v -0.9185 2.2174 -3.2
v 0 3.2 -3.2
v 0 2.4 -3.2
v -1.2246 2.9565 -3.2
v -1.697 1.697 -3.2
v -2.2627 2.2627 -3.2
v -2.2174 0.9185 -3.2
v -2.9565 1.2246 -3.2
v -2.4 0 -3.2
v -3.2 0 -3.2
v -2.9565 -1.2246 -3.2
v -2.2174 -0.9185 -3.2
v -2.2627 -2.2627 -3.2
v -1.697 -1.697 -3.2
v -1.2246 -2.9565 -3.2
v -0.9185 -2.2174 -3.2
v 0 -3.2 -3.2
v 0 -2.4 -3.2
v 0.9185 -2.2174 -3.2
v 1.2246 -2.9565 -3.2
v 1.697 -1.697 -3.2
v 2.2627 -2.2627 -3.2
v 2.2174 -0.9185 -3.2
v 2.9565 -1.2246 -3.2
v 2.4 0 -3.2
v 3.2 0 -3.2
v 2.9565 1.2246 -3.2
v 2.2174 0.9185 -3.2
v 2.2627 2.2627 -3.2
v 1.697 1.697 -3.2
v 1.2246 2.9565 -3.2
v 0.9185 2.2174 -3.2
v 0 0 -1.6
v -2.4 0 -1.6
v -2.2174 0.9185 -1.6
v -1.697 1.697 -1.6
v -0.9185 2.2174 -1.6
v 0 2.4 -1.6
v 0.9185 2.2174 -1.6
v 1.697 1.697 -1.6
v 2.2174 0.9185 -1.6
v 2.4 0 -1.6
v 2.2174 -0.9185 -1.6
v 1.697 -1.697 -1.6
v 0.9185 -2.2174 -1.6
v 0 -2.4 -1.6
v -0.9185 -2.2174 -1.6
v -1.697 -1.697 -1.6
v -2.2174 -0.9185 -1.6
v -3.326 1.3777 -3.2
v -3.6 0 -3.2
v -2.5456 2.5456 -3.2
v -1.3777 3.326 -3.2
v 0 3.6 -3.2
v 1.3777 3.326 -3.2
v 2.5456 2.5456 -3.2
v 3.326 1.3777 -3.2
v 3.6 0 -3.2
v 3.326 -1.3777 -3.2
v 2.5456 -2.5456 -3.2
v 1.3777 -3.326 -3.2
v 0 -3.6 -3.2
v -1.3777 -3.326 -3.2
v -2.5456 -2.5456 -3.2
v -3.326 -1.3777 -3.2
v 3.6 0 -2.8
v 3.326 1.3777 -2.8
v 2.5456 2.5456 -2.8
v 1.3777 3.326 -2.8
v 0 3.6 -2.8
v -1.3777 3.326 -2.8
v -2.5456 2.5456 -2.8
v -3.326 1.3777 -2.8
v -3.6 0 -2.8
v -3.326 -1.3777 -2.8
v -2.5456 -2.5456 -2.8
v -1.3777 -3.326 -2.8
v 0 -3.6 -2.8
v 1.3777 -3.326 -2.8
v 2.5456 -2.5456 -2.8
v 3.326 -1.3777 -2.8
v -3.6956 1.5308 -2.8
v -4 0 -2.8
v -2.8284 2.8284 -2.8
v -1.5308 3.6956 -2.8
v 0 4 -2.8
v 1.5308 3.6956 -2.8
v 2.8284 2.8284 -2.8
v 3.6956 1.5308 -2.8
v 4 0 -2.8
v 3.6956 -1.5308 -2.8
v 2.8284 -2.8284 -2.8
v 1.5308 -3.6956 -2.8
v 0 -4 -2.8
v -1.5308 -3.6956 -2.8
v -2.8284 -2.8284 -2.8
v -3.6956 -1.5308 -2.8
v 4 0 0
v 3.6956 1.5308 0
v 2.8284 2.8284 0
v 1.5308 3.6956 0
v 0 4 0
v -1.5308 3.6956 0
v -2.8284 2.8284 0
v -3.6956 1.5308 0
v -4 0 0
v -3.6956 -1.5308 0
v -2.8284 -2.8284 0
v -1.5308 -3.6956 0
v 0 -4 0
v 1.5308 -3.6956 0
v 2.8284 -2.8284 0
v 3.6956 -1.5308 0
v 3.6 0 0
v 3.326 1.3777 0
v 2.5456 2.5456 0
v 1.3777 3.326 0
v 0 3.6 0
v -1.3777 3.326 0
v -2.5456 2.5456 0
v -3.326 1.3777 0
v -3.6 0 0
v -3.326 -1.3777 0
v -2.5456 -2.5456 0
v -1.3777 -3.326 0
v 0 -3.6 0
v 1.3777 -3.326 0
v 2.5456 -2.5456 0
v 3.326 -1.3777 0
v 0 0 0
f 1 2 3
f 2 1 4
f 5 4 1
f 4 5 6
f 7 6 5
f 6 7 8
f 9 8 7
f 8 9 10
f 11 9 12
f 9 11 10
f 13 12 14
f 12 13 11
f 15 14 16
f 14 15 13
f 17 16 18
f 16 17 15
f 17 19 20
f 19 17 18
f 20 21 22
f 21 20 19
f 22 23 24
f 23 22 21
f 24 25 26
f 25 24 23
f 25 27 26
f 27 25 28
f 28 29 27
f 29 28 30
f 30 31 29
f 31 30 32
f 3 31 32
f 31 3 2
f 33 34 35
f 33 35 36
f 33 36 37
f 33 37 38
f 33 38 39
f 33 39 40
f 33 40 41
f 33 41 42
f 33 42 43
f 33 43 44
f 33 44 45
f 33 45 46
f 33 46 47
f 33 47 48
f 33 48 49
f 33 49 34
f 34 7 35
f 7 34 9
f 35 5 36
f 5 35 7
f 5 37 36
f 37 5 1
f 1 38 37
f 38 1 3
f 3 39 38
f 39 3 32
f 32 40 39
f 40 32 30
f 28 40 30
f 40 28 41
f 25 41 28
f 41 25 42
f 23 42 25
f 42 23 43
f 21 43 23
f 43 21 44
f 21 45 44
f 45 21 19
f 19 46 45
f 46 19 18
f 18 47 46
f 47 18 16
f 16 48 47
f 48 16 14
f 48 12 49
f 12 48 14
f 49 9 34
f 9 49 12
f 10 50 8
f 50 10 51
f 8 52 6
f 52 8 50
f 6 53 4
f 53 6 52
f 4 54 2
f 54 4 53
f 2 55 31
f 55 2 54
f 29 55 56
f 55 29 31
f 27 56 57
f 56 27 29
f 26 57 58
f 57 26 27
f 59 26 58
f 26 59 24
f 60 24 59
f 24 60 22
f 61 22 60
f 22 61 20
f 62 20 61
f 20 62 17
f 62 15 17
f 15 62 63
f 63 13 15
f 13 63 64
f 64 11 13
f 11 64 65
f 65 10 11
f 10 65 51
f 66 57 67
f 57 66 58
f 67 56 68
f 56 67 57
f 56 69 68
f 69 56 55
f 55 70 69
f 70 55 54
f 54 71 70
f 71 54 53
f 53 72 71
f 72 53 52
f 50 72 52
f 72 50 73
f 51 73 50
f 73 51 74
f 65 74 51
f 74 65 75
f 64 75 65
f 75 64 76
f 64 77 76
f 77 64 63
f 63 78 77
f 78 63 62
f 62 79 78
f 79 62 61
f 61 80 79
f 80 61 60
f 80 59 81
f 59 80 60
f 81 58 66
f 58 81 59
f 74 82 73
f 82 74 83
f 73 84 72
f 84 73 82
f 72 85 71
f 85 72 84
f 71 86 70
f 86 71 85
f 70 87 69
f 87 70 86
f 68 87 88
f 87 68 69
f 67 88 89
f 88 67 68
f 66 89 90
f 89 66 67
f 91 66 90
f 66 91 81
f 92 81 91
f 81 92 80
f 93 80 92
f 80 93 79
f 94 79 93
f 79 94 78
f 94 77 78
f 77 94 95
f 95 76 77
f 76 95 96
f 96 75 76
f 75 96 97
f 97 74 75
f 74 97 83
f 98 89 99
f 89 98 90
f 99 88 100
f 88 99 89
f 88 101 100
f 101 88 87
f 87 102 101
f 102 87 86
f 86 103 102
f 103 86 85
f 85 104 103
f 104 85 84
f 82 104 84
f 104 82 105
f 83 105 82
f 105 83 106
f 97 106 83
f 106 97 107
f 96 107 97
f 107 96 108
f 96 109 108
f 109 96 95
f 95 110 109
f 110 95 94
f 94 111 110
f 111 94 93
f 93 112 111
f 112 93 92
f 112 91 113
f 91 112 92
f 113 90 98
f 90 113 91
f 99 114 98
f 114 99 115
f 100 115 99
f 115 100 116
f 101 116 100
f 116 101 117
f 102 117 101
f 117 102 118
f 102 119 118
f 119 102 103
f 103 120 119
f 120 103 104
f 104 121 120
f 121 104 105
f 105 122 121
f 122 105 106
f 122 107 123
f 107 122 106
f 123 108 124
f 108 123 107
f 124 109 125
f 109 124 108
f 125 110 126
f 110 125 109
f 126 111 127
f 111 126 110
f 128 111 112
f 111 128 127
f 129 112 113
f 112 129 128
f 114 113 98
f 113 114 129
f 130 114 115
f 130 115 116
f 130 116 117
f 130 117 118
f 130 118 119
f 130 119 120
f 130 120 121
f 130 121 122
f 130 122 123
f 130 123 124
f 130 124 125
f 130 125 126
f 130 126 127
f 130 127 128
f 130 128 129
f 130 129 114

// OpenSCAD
// file: ../p/4-4ring3.scad
use <../lib.scad>
function ldraw_lib__4_4ring3() = [
// 0 Ring  3 x 1.0
// 0 Name: 4-4ring3.dat
// 0 Author: James Jessiman
// 0 !LDRAW_ORG Primitive UPDATE 2009-01
// 0 !LICENSE Licensed under CC BY 4.0 : see CAreadme.txt
// 
// 0 BFC CERTIFY CCW
  [0,"BFC","CERTIFY"],
  [0,"BFC","CCW"],
// 
// 0 !HISTORY 1998-12-15 [PTadmin] Official Update 1998-10
// 0 !HISTORY 2002-04-05 [hafhead] Added BFC statement
// 0 !HISTORY 2002-04-25 [PTadmin] Official Update 2002-02
// 0 !HISTORY 2007-06-24 [PTadmin] Header formatted for Contributor Agreement
// 0 !HISTORY 2008-07-01 [PTadmin] Official Update 2008-01
// 0 !HISTORY 2008-08-26 [cwdee] Switch polygon winding and rename
// 0 !HISTORY 2009-05-02 [PTadmin] Official Update 2009-01
// 
// 
// 4 16 -1.5308 0 3.6956 -1.1481 0 2.7717 0 0 3 0 0 4
  [4,16,-1.5308,0,3.6956,-1.1481,0,2.7717,0,0,3,0,0,4],
// 4 16 -2.8284 0 2.8284 -2.1213 0 2.1213 -1.1481 0 2.7717 -1.5308 0 3.6956
  [4,16,-2.8284,0,2.8284,-2.1213,0,2.1213,-1.1481,0,2.7717,-1.5308,0,3.6956],
// 4 16 -3.6956 0 1.5308 -2.7717 0 1.1481 -2.1213 0 2.1213 -2.8284 0 2.8284
  [4,16,-3.6956,0,1.5308,-2.7717,0,1.1481,-2.1213,0,2.1213,-2.8284,0,2.8284],
// 4 16 -4 0 0 -3 0 0 -2.7717 0 1.1481 -3.6956 0 1.5308
  [4,16,-4,0,0,-3,0,0,-2.7717,0,1.1481,-3.6956,0,1.5308],
// 4 16 -3.6956 0 -1.5308 -2.7717 0 -1.1481 -3 0 0 -4 0 0
  [4,16,-3.6956,0,-1.5308,-2.7717,0,-1.1481,-3,0,0,-4,0,0],
// 4 16 -2.8284 0 -2.8284 -2.1213 0 -2.1213 -2.7717 0 -1.1481 -3.6956 0 -1.5308
  [4,16,-2.8284,0,-2.8284,-2.1213,0,-2.1213,-2.7717,0,-1.1481,-3.6956,0,-1.5308],
// 4 16 -1.5308 0 -3.6956 -1.1481 0 -2.7717 -2.1213 0 -2.1213 -2.8284 0 -2.8284
  [4,16,-1.5308,0,-3.6956,-1.1481,0,-2.7717,-2.1213,0,-2.1213,-2.8284,0,-2.8284],
// 4 16 0 0 -4 0 0 -3 -1.1481 0 -2.7717 -1.5308 0 -3.6956
  [4,16,0,0,-4,0,0,-3,-1.1481,0,-2.7717,-1.5308,0,-3.6956],
// 4 16 1.5308 0 -3.6956 1.1481 0 -2.7717 0 0 -3 0 0 -4
  [4,16,1.5308,0,-3.6956,1.1481,0,-2.7717,0,0,-3,0,0,-4],
// 4 16 2.8284 0 -2.8284 2.1213 0 -2.1213 1.1481 0 -2.7717 1.5308 0 -3.6956
  [4,16,2.8284,0,-2.8284,2.1213,0,-2.1213,1.1481,0,-2.7717,1.5308,0,-3.6956],
// 4 16 3.6956 0 -1.5308 2.7717 0 -1.1481 2.1213 0 -2.1213 2.8284 0 -2.8284
  [4,16,3.6956,0,-1.5308,2.7717,0,-1.1481,2.1213,0,-2.1213,2.8284,0,-2.8284],
// 4 16 4 0 0 3 0 0 2.7717 0 -1.1481 3.6956 0 -1.5308
  [4,16,4,0,0,3,0,0,2.7717,0,-1.1481,3.6956,0,-1.5308],
// 4 16 3.6956 0 1.5308 2.7717 0 1.1481 3 0 0 4 0 0
  [4,16,3.6956,0,1.5308,2.7717,0,1.1481,3,0,0,4,0,0],
// 4 16 2.8284 0 2.8284 2.1213 0 2.1213 2.7717 0 1.1481 3.6956 0 1.5308
  [4,16,2.8284,0,2.8284,2.1213,0,2.1213,2.7717,0,1.1481,3.6956,0,1.5308],
// 4 16 1.5308 0 3.6956 1.1481 0 2.7717 2.1213 0 2.1213 2.8284 0 2.8284
  [4,16,1.5308,0,3.6956,1.1481,0,2.7717,2.1213,0,2.1213,2.8284,0,2.8284],
// 4 16 0 0 4 0 0 3 1.1481 0 2.7717 1.5308 0 3.6956
  [4,16,0,0,4,0,0,3,1.1481,0,2.7717,1.5308,0,3.6956],
// 0
];
module ldraw_lib__4_4ring3(step=0, col=false, unit=2/5, alt=false, line=0.2, solid=!$preview)
    makepoly(ldraw_lib__4_4ring3(), step=step, col=col, unit=unit, alt=alt, line=line, solid=solid);
ldraw_lib__4_4ring3(line=0.2);
// file: ../p/4-4cylc.scad
use <../lib.scad>
use <4-4cyli.scad>
use <4-4disc.scad>
use <4-4edge.scad>
function ldraw_lib__4_4cylc() = [
// 0 Cylinder Closed 1.0
// 0 Name: 4-4cylc.dat
// 0 Author: Alex Taylor [anathema]
// 0 !LDRAW_ORG Primitive UPDATE 2009-02
// 0 !LICENSE Licensed under CC BY 4.0 : see CAreadme.txt
// 
// 0 BFC CERTIFY CCW
  [0,"BFC","CERTIFY"],
  [0,"BFC","CCW"],
// 
// 0 !HISTORY 2008-12-29 [cwdee] Removed one disc
// 0 !HISTORY 2009-09-03 [PTadmin] Official Update 2009-02
// 
// 
// 1 16 0 0 0 1 0 0 0 1 0 0 0 1 4-4edge.dat
  [1,16,0,0,0,1,0,0,0,1,0,0,0,1, ldraw_lib__4_4edge()],
// 1 16 0 1 0 1 0 0 0 1 0 0 0 1 4-4edge.dat
  [1,16,0,1,0,1,0,0,0,1,0,0,0,1, ldraw_lib__4_4edge()],
// 1 16 0 0 0 1 0 0 0 1 0 0 0 1 4-4disc.dat
  [1,16,0,0,0,1,0,0,0,1,0,0,0,1, ldraw_lib__4_4disc()],
// 1 16 0 0 0 1 0 0 0 1 0 0 0 1 4-4cyli.dat
  [1,16,0,0,0,1,0,0,0,1,0,0,0,1, ldraw_lib__4_4cyli()],
// 0
];
module ldraw_lib__4_4cylc(step=0, col=false, unit=2/5, alt=false, line=0.2, solid=!$preview)
    makepoly(ldraw_lib__4_4cylc(), step=step, col=col, unit=unit, alt=alt, line=line, solid=solid);
ldraw_lib__4_4cylc(line=0.2);
// file: ../p/4-4edge.scad
use <../lib.scad>
function ldraw_lib__4_4edge() = [
// 0 Circle 1.0
// 0 Name: 4-4edge.dat
// 0 Author: James Jessiman
// 0 !LDRAW_ORG Primitive UPDATE 2017-01
// 0 !LICENSE Licensed under CC BY 4.0 : see CAreadme.txt
// 
// 0 BFC CERTIFY CCW
  [0,"BFC","CERTIFY"],
  [0,"BFC","CCW"],
// 
// 0 !HISTORY 1998-12-15 [PTadmin] Official Update 1998-10
// 0 !HISTORY 2005-12-28 [PTadmin] Official Update 2005-01
// 0 !HISTORY 2007-06-24 [PTadmin] Header formatted for Contributor Agreement
// 0 !HISTORY 2008-07-01 [PTadmin] Official Update 2008-01
// 0 !HISTORY 2017-01-15 [Steffen] BFCed
// 0 !HISTORY 2017-12-30 [PTadmin] Official Update 2017-01
// 
// 
// 2 24 1 0 0 0.9239 0 0.3827
  [2,24,1,0,0,0.9239,0,0.3827],
// 2 24 0.9239 0 0.3827 0.7071 0 0.7071
  [2,24,0.9239,0,0.3827,0.7071,0,0.7071],
// 2 24 0.7071 0 0.7071 0.3827 0 0.9239
  [2,24,0.7071,0,0.7071,0.3827,0,0.9239],
// 2 24 0.3827 0 0.9239 0 0 1
  [2,24,0.3827,0,0.9239,0,0,1],
// 2 24 0 0 1 -0.3827 0 0.9239
  [2,24,0,0,1,-0.3827,0,0.9239],
// 2 24 -0.3827 0 0.9239 -0.7071 0 0.7071
  [2,24,-0.3827,0,0.9239,-0.7071,0,0.7071],
// 2 24 -0.7071 0 0.7071 -0.9239 0 0.3827
  [2,24,-0.7071,0,0.7071,-0.9239,0,0.3827],
// 2 24 -0.9239 0 0.3827 -1 0 -0
  [2,24,-0.9239,0,0.3827,-1,0,-0],
// 2 24 -1 0 -0 -0.9239 0 -0.3827
  [2,24,-1,0,-0,-0.9239,0,-0.3827],
// 2 24 -0.9239 0 -0.3827 -0.7071 0 -0.7071
  [2,24,-0.9239,0,-0.3827,-0.7071,0,-0.7071],
// 2 24 -0.7071 0 -0.7071 -0.3827 0 -0.9239
  [2,24,-0.7071,0,-0.7071,-0.3827,0,-0.9239],
// 2 24 -0.3827 0 -0.9239 0 0 -1
  [2,24,-0.3827,0,-0.9239,0,0,-1],
// 2 24 0 0 -1 0.3827 0 -0.9239
  [2,24,0,0,-1,0.3827,0,-0.9239],
// 2 24 0.3827 0 -0.9239 0.7071 0 -0.7071
  [2,24,0.3827,0,-0.9239,0.7071,0,-0.7071],
// 2 24 0.7071 0 -0.7071 0.9239 0 -0.3827
  [2,24,0.7071,0,-0.7071,0.9239,0,-0.3827],
// 2 24 0.9239 0 -0.3827 1 0 0
  [2,24,0.9239,0,-0.3827,1,0,0],
];
module ldraw_lib__4_4edge(step=0, col=false, unit=2/5, alt=false, line=0.2, solid=!$preview)
    makepoly(ldraw_lib__4_4edge(), step=step, col=col, unit=unit, alt=alt, line=line, solid=solid);
ldraw_lib__4_4edge(line=0.2);
// file: ../p/4-4cyli.scad
use <../lib.scad>
function ldraw_lib__4_4cyli() = [
// 0 Cylinder 1.0
// 0 Name: 4-4cyli.dat
// 0 Author: James Jessiman
// 0 !LDRAW_ORG Primitive UPDATE 2005-01
// 0 !LICENSE Licensed under CC BY 4.0 : see CAreadme.txt
// 
// 0 BFC CERTIFY CCW
  [0,"BFC","CERTIFY"],
  [0,"BFC","CCW"],
// 
// 0 !HISTORY 1998-12-15 [PTadmin] Official Update 1998-10
// 0 !HISTORY 2002-03-23 [sbliss] Added BFC statement; merged headers from files in distributions LDraw 0.27 and Complete.
// 0 !HISTORY 2002-04-25 [PTadmin] Official Update 2002-02
// 0 !HISTORY 2004-12-14 [guyvivan] BFC CCW
// 0 !HISTORY 2005-12-28 [PTadmin] Official Update 2005-01
// 0 !HISTORY 2007-06-24 [PTadmin] Header formatted for Contributor Agreement
// 0 !HISTORY 2008-07-01 [PTadmin] Official Update 2008-01
// 
// 
// 4 16 1 1 0 0.9239 1 0.3827 0.9239 0 0.3827 1 0 0
  [4,16,1,1,0,0.9239,1,0.3827,0.9239,0,0.3827,1,0,0],
// 5 24 1 0 0 1 1 0 0.9239 0 0.3827 0.9239 0 -0.3827
  [5,24,1,0,0,1,1,0,0.9239,0,0.3827,0.9239,0,-0.3827],
// 4 16 0.9239 1 0.3827 0.7071 1 0.7071 0.7071 0 0.7071 0.9239 0 0.3827
  [4,16,0.9239,1,0.3827,0.7071,1,0.7071,0.7071,0,0.7071,0.9239,0,0.3827],
// 5 24 0.9239 0 0.3827 0.9239 1 0.3827 0.7071 0 0.7071 1 0 0
  [5,24,0.9239,0,0.3827,0.9239,1,0.3827,0.7071,0,0.7071,1,0,0],
// 4 16 0.7071 1 0.7071 0.3827 1 0.9239 0.3827 0 0.9239 0.7071 0 0.7071
  [4,16,0.7071,1,0.7071,0.3827,1,0.9239,0.3827,0,0.9239,0.7071,0,0.7071],
// 5 24 0.7071 0 0.7071 0.7071 1 0.7071 0.3827 0 0.9239 0.9239 0 0.3827
  [5,24,0.7071,0,0.7071,0.7071,1,0.7071,0.3827,0,0.9239,0.9239,0,0.3827],
// 4 16 0.3827 1 0.9239 0 1 1 0 0 1 0.3827 0 0.9239
  [4,16,0.3827,1,0.9239,0,1,1,0,0,1,0.3827,0,0.9239],
// 5 24 0.3827 0 0.9239 0.3827 1 0.9239 0 0 1 0.7071 0 0.7071
  [5,24,0.3827,0,0.9239,0.3827,1,0.9239,0,0,1,0.7071,0,0.7071],
// 4 16 0 1 1 -0.3827 1 0.9239 -0.3827 0 0.9239 0 0 1
  [4,16,0,1,1,-0.3827,1,0.9239,-0.3827,0,0.9239,0,0,1],
// 5 24 0 0 1 0 1 1 -0.3827 0 0.9239 0.3827 0 0.9239
  [5,24,0,0,1,0,1,1,-0.3827,0,0.9239,0.3827,0,0.9239],
// 4 16 -0.3827 1 0.9239 -0.7071 1 0.7071 -0.7071 0 0.7071 -0.3827 0 0.9239
  [4,16,-0.3827,1,0.9239,-0.7071,1,0.7071,-0.7071,0,0.7071,-0.3827,0,0.9239],
// 5 24 -0.3827 0 0.9239 -0.3827 1 0.9239 -0.7071 0 0.7071 0 0 1
  [5,24,-0.3827,0,0.9239,-0.3827,1,0.9239,-0.7071,0,0.7071,0,0,1],
// 4 16 -0.7071 1 0.7071 -0.9239 1 0.3827 -0.9239 0 0.3827 -0.7071 0 0.7071
  [4,16,-0.7071,1,0.7071,-0.9239,1,0.3827,-0.9239,0,0.3827,-0.7071,0,0.7071],
// 5 24 -0.7071 0 0.7071 -0.7071 1 0.7071 -0.9239 0 0.3827 -0.3827 0 0.9239
  [5,24,-0.7071,0,0.7071,-0.7071,1,0.7071,-0.9239,0,0.3827,-0.3827,0,0.9239],
// 4 16 -0.9239 1 0.3827 -1 1 0 -1 0 0 -0.9239 0 0.3827
  [4,16,-0.9239,1,0.3827,-1,1,0,-1,0,0,-0.9239,0,0.3827],
// 5 24 -0.9239 0 0.3827 -0.9239 1 0.3827 -1 0 0 -0.7071 0 0.7071
  [5,24,-0.9239,0,0.3827,-0.9239,1,0.3827,-1,0,0,-0.7071,0,0.7071],
// 4 16 -1 1 0 -0.9239 1 -0.3827 -0.9239 0 -0.3827 -1 0 0
  [4,16,-1,1,0,-0.9239,1,-0.3827,-0.9239,0,-0.3827,-1,0,0],
// 5 24 -1 0 0 -1 1 0 -0.9239 0 -0.3827 -0.9239 0 0.3827
  [5,24,-1,0,0,-1,1,0,-0.9239,0,-0.3827,-0.9239,0,0.3827],
// 4 16 -0.9239 1 -0.3827 -0.7071 1 -0.7071 -0.7071 0 -0.7071 -0.9239 0 -0.3827
  [4,16,-0.9239,1,-0.3827,-0.7071,1,-0.7071,-0.7071,0,-0.7071,-0.9239,0,-0.3827],
// 5 24 -0.9239 0 -0.3827 -0.9239 1 -0.3827 -0.7071 0 -0.7071 -1 0 0
  [5,24,-0.9239,0,-0.3827,-0.9239,1,-0.3827,-0.7071,0,-0.7071,-1,0,0],
// 4 16 -0.7071 1 -0.7071 -0.3827 1 -0.9239 -0.3827 0 -0.9239 -0.7071 0 -0.7071
  [4,16,-0.7071,1,-0.7071,-0.3827,1,-0.9239,-0.3827,0,-0.9239,-0.7071,0,-0.7071],
// 5 24 -0.7071 0 -0.7071 -0.7071 1 -0.7071 -0.3827 0 -0.9239 -0.9239 0 -0.3827
  [5,24,-0.7071,0,-0.7071,-0.7071,1,-0.7071,-0.3827,0,-0.9239,-0.9239,0,-0.3827],
// 4 16 -0.3827 1 -0.9239 0 1 -1 0 0 -1 -0.3827 0 -0.9239
  [4,16,-0.3827,1,-0.9239,0,1,-1,0,0,-1,-0.3827,0,-0.9239],
// 5 24 -0.3827 0 -0.9239 -0.3827 1 -0.9239 0 0 -1 -0.7071 0 -0.7071
  [5,24,-0.3827,0,-0.9239,-0.3827,1,-0.9239,0,0,-1,-0.7071,0,-0.7071],
// 4 16 0 1 -1 0.3827 1 -0.9239 0.3827 0 -0.9239 0 0 -1
  [4,16,0,1,-1,0.3827,1,-0.9239,0.3827,0,-0.9239,0,0,-1],
// 5 24 0 0 -1 0 1 -1 0.3827 0 -0.9239 -0.3827 0 -0.9239
  [5,24,0,0,-1,0,1,-1,0.3827,0,-0.9239,-0.3827,0,-0.9239],
// 4 16 0.3827 1 -0.9239 0.7071 1 -0.7071 0.7071 0 -0.7071 0.3827 0 -0.9239
  [4,16,0.3827,1,-0.9239,0.7071,1,-0.7071,0.7071,0,-0.7071,0.3827,0,-0.9239],
// 5 24 0.3827 0 -0.9239 0.3827 1 -0.9239 0.7071 0 -0.7071 0 0 -1
  [5,24,0.3827,0,-0.9239,0.3827,1,-0.9239,0.7071,0,-0.7071,0,0,-1],
// 4 16 0.7071 1 -0.7071 0.9239 1 -0.3827 0.9239 0 -0.3827 0.7071 0 -0.7071
  [4,16,0.7071,1,-0.7071,0.9239,1,-0.3827,0.9239,0,-0.3827,0.7071,0,-0.7071],
// 5 24 0.7071 0 -0.7071 0.7071 1 -0.7071 0.9239 0 -0.3827 0.3827 0 -0.9239
  [5,24,0.7071,0,-0.7071,0.7071,1,-0.7071,0.9239,0,-0.3827,0.3827,0,-0.9239],
// 4 16 0.9239 1 -0.3827 1 1 0 1 0 0 0.9239 0 -0.3827
  [4,16,0.9239,1,-0.3827,1,1,0,1,0,0,0.9239,0,-0.3827],
// 5 24 0.9239 0 -0.3827 0.9239 1 -0.3827 1 0 0 0.7071 0 -0.7071
  [5,24,0.9239,0,-0.3827,0.9239,1,-0.3827,1,0,0,0.7071,0,-0.7071],
// 0
];
module ldraw_lib__4_4cyli(step=0, col=false, unit=2/5, alt=false, line=0.2, solid=!$preview)
    makepoly(ldraw_lib__4_4cyli(), step=step, col=col, unit=unit, alt=alt, line=line, solid=solid);
ldraw_lib__4_4cyli(line=0.2);
// file: ../p/stud4o.scad
use <../lib.scad>
use <4-4cylc.scad>
use <4-4ring3.scad>
function ldraw_lib__stud4o() = [
// 0 Stud Tube Open without Outer Cylinder
// 0 Name: stud4o.dat
// 0 Author: Magnus Forsberg [MagFors]
// 0 !LDRAW_ORG Primitive UPDATE 2011-02
// 0 !LICENSE Licensed under CC BY 4.0 : see CAreadme.txt
// 
// 0 !HELP This stud is a "antistud" to be used like a underside stud,
// 0 !HELP but without the outer cylinder.
// 0 !HELP 1 47 0 0 0 1 0 0 0 1 0 0 0 1 stud4.dat
// 
// 0 BFC CERTIFY CCW
  [0,"BFC","CERTIFY"],
  [0,"BFC","CCW"],
// 
// 0 !HISTORY 2011-12-29 [PTadmin] Official Update 2011-02
// 
// 
// 1 16 0 -4 0 2 0 0 0 1 0 0 0 2 4-4ring3.dat
  [1,16,0,-4,0,2,0,0,0,1,0,0,0,2, ldraw_lib__4_4ring3()],
// 0 BFC INVERTNEXT
  [0,"BFC","INVERTNEXT"],
// 1 16 0 0 0 -6 0 0 0 -4 0 0 0 6 4-4cylc.dat
  [1,16,0,0,0,-6,0,0,0,-4,0,0,0,6, ldraw_lib__4_4cylc()],
];
module ldraw_lib__stud4o(step=0, col=false, unit=2/5, alt=false, line=0.2, solid=!$preview)
    makepoly(ldraw_lib__stud4o(), step=step, col=col, unit=unit, alt=alt, line=line, solid=solid);
ldraw_lib__stud4o(line=0.2);
// file: ../p/4-4ring8.scad
use <../lib.scad>
function ldraw_lib__4_4ring8() = [
// 0 Ring  8 x 1.0
// 0 Name: 4-4ring8.dat
// 0 Author: Steffen [Steffen]
// 0 !LDRAW_ORG Primitive UPDATE 2012-01
// 0 !LICENSE Licensed under CC BY 4.0 : see CAreadme.txt
// 
// 0 BFC CERTIFY CCW
  [0,"BFC","CERTIFY"],
  [0,"BFC","CCW"],
// 
// 0 !HISTORY 2003-12-19 [PTadmin] Official Update 2003-03
// 0 !HISTORY 2007-06-24 [PTadmin] Header formatted for Contributor Agreement
// 0 !HISTORY 2008-07-01 [PTadmin] Official Update 2008-01
// 0 !HISTORY 2012-02-16 [Philo] Changed to CCW
// 0 !HISTORY 2012-03-30 [PTadmin] Official Update 2012-01
// 
// 
// 4 16 9 0 0 8.3151 0 3.4443 7.3912 0 3.0616 8 0 0
  [4,16,9,0,0,8.3151,0,3.4443,7.3912,0,3.0616,8,0,0],
// 4 16 8.3151 0 3.4443 6.3639 0 6.3639 5.6568 0 5.6568 7.3912 0 3.0616
  [4,16,8.3151,0,3.4443,6.3639,0,6.3639,5.6568,0,5.6568,7.3912,0,3.0616],
// 4 16 6.3639 0 6.3639 3.4443 0 8.3151 3.0616 0 7.3912 5.6568 0 5.6568
  [4,16,6.3639,0,6.3639,3.4443,0,8.3151,3.0616,0,7.3912,5.6568,0,5.6568],
// 4 16 3.4443 0 8.3151 0 0 9 0 0 8 3.0616 0 7.3912
  [4,16,3.4443,0,8.3151,0,0,9,0,0,8,3.0616,0,7.3912],
// 4 16 0 0 9 -3.4443 0 8.3151 -3.0616 0 7.3912 0 0 8
  [4,16,0,0,9,-3.4443,0,8.3151,-3.0616,0,7.3912,0,0,8],
// 4 16 -3.4443 0 8.3151 -6.3639 0 6.3639 -5.6568 0 5.6568 -3.0616 0 7.3912
  [4,16,-3.4443,0,8.3151,-6.3639,0,6.3639,-5.6568,0,5.6568,-3.0616,0,7.3912],
// 4 16 -6.3639 0 6.3639 -8.3151 0 3.4443 -7.3912 0 3.0616 -5.6568 0 5.6568
  [4,16,-6.3639,0,6.3639,-8.3151,0,3.4443,-7.3912,0,3.0616,-5.6568,0,5.6568],
// 4 16 -8.3151 0 3.4443 -9 0 0 -8 0 0 -7.3912 0 3.0616
  [4,16,-8.3151,0,3.4443,-9,0,0,-8,0,0,-7.3912,0,3.0616],
// 4 16 -9 0 0 -8.3151 0 -3.4443 -7.3912 0 -3.0616 -8 0 0
  [4,16,-9,0,0,-8.3151,0,-3.4443,-7.3912,0,-3.0616,-8,0,0],
// 4 16 -8.3151 0 -3.4443 -6.3639 0 -6.3639 -5.6568 0 -5.6568 -7.3912 0 -3.0616
  [4,16,-8.3151,0,-3.4443,-6.3639,0,-6.3639,-5.6568,0,-5.6568,-7.3912,0,-3.0616],
// 4 16 -6.3639 0 -6.3639 -3.4443 0 -8.3151 -3.0616 0 -7.3912 -5.6568 0 -5.6568
  [4,16,-6.3639,0,-6.3639,-3.4443,0,-8.3151,-3.0616,0,-7.3912,-5.6568,0,-5.6568],
// 4 16 -3.4443 0 -8.3151 0 0 -9 0 0 -8 -3.0616 0 -7.3912
  [4,16,-3.4443,0,-8.3151,0,0,-9,0,0,-8,-3.0616,0,-7.3912],
// 4 16 0 0 -9 3.4443 0 -8.3151 3.0616 0 -7.3912 0 0 -8
  [4,16,0,0,-9,3.4443,0,-8.3151,3.0616,0,-7.3912,0,0,-8],
// 4 16 3.4443 0 -8.3151 6.3639 0 -6.3639 5.6568 0 -5.6568 3.0616 0 -7.3912
  [4,16,3.4443,0,-8.3151,6.3639,0,-6.3639,5.6568,0,-5.6568,3.0616,0,-7.3912],
// 4 16 6.3639 0 -6.3639 8.3151 0 -3.4443 7.3912 0 -3.0616 5.6568 0 -5.6568
  [4,16,6.3639,0,-6.3639,8.3151,0,-3.4443,7.3912,0,-3.0616,5.6568,0,-5.6568],
// 4 16 8.3151 0 -3.4443 9 0 0 8 0 0 7.3912 0 -3.0616
  [4,16,8.3151,0,-3.4443,9,0,0,8,0,0,7.3912,0,-3.0616],
];
module ldraw_lib__4_4ring8(step=0, col=false, unit=2/5, alt=false, line=0.2, solid=!$preview)
    makepoly(ldraw_lib__4_4ring8(), step=step, col=col, unit=unit, alt=alt, line=line, solid=solid);
ldraw_lib__4_4ring8(line=0.2);
// file: ../p/4-4cylo.scad
use <../lib.scad>
use <4-4cyli.scad>
use <4-4edge.scad>
function ldraw_lib__4_4cylo() = [
// 0 Cylinder Open 1.0
// 0 Name: 4-4cylo.dat
// 0 Author: Mark Kennedy [mkennedy]
// 0 !LDRAW_ORG Primitive UPDATE 2010-01
// 0 !LICENSE Licensed under CC BY 4.0 : see CAreadme.txt
// 
// 0 BFC CERTIFY CCW
  [0,"BFC","CERTIFY"],
  [0,"BFC","CCW"],
// 
// 0 !HISTORY 2010-04-05 [PTadmin] Official Update 2010-01
// 
// 
// 1 16 0 0 0 1 0 0 0 1 0 0 0 1 4-4edge.dat
  [1,16,0,0,0,1,0,0,0,1,0,0,0,1, ldraw_lib__4_4edge()],
// 1 16 0 1 0 1 0 0 0 1 0 0 0 1 4-4edge.dat
  [1,16,0,1,0,1,0,0,0,1,0,0,0,1, ldraw_lib__4_4edge()],
// 1 16 0 0 0 1 0 0 0 1 0 0 0 1 4-4cyli.dat
  [1,16,0,0,0,1,0,0,0,1,0,0,0,1, ldraw_lib__4_4cyli()],
// 0
];
module ldraw_lib__4_4cylo(step=0, col=false, unit=2/5, alt=false, line=0.2, solid=!$preview)
    makepoly(ldraw_lib__4_4cylo(), step=step, col=col, unit=unit, alt=alt, line=line, solid=solid);
ldraw_lib__4_4cylo(line=0.2);
// file: s/98138s02.scad
use <../../lib.scad>
use <../../p/4-4cylo.scad>
use <../../p/4-4ring8.scad>
use <../../p/4-4ring9.scad>
use <../../p/stud4o.scad>
function ldraw_lib__s__98138s02() = [
// 0 ~Tile  1 x  1 Round with Groove without Complete Top Face
// 0 Name: s\98138s02.dat
// 0 Author: Magnus Forsberg [MagFors]
// 0 !LDRAW_ORG Subpart UPDATE 2020-01
// 0 !LICENSE Licensed under CC BY 4.0 : see CAreadme.txt
// 
// 0 BFC CERTIFY CCW
  [0,"BFC","CERTIFY"],
  [0,"BFC","CCW"],
// 
// 0 !HISTORY 2020-06-28 [PTadmin] Official Update 2020-01
// 
// 
// 1 16 0 4 0 1 0 0 0 -1 0 0 0 1 stud4o.dat
  [1,16,0,4,0,1,0,0,0,-1,0,0,0,1, ldraw_lib__stud4o()],
// 1 16 0 8 0 -1 0 0 0 -1 0 0 0 1 4-4ring8.dat
  [1,16,0,8,0,-1,0,0,0,-1,0,0,0,1, ldraw_lib__4_4ring8()],
// 1 16 0 7 0 9 0 0 0 1 0 0 0 9 4-4cylo.dat
  [1,16,0,7,0,9,0,0,0,1,0,0,0,9, ldraw_lib__4_4cylo()],
// 1 16 0 7 0 -1 0 0 0 -1 0 0 0 1 4-4ring9.dat
  [1,16,0,7,0,-1,0,0,0,-1,0,0,0,1, ldraw_lib__4_4ring9()],
// 1 16 0 0 0 10 0 0 0 7 0 0 0 10 4-4cylo.dat
  [1,16,0,0,0,10,0,0,0,7,0,0,0,10, ldraw_lib__4_4cylo()],
];
module ldraw_lib__s__98138s02(step=0, col=false, unit=2/5, alt=false, line=0.2, solid=!$preview)
    makepoly(ldraw_lib__s__98138s02(), step=step, col=col, unit=unit, alt=alt, line=line, solid=solid);
ldraw_lib__s__98138s02(line=0.2);
// file: ../p/4-4ring9.scad
use <../lib.scad>
function ldraw_lib__4_4ring9() = [
// 0 Ring  9 x 1.0
// 0 Name: 4-4ring9.dat
// 0 Author: Magnus Forsberg [MagFors]
// 0 !LDRAW_ORG Primitive UPDATE 2024-01
// 0 !LICENSE Licensed under CC BY 4.0 : see CAreadme.txt
// 
// 0 BFC CERTIFY CCW
  [0,"BFC","CERTIFY"],
  [0,"BFC","CCW"],
// 
// 0 !HISTORY 2004-04-22 [PTadmin] Official Update 2004-02
// 0 !HISTORY 2007-06-24 [PTadmin] Header formatted for Contributor Agreement
// 0 !HISTORY 2008-07-01 [PTadmin] Official Update 2008-01
// 0 !HISTORY 2024-01-04 [MagFors] Complete regeneration, original by jriley
// 0 !HISTORY 2024-01-29 [OrionP] Official Update 2024-01
// 
// 4 16 10 0 0 9.239 0 3.827 8.3151 0 3.4443 9 0 0
  [4,16,10,0,0,9.239,0,3.827,8.3151,0,3.4443,9,0,0],
// 4 16 9.239 0 3.827 7.071 0 7.071 6.3639 0 6.3639 8.3151 0 3.4443
  [4,16,9.239,0,3.827,7.071,0,7.071,6.3639,0,6.3639,8.3151,0,3.4443],
// 4 16 7.071 0 7.071 3.827 0 9.239 3.4443 0 8.3151 6.3639 0 6.3639
  [4,16,7.071,0,7.071,3.827,0,9.239,3.4443,0,8.3151,6.3639,0,6.3639],
// 4 16 3.827 0 9.239 0 0 10 0 0 9 3.4443 0 8.3151
  [4,16,3.827,0,9.239,0,0,10,0,0,9,3.4443,0,8.3151],
// 4 16 0 0 10 -3.827 0 9.239 -3.4443 0 8.3151 0 0 9
  [4,16,0,0,10,-3.827,0,9.239,-3.4443,0,8.3151,0,0,9],
// 4 16 -3.827 0 9.239 -7.071 0 7.071 -6.3639 0 6.3639 -3.4443 0 8.3151
  [4,16,-3.827,0,9.239,-7.071,0,7.071,-6.3639,0,6.3639,-3.4443,0,8.3151],
// 4 16 -7.071 0 7.071 -9.239 0 3.827 -8.3151 0 3.4443 -6.3639 0 6.3639
  [4,16,-7.071,0,7.071,-9.239,0,3.827,-8.3151,0,3.4443,-6.3639,0,6.3639],
// 4 16 -9.239 0 3.827 -10 0 0 -9 0 0 -8.3151 0 3.4443
  [4,16,-9.239,0,3.827,-10,0,0,-9,0,0,-8.3151,0,3.4443],
// 4 16 -10 0 0 -9.239 0 -3.827 -8.3151 0 -3.4443 -9 0 0
  [4,16,-10,0,0,-9.239,0,-3.827,-8.3151,0,-3.4443,-9,0,0],
// 4 16 -9.239 0 -3.827 -7.071 0 -7.071 -6.3639 0 -6.3639 -8.3151 0 -3.4443
  [4,16,-9.239,0,-3.827,-7.071,0,-7.071,-6.3639,0,-6.3639,-8.3151,0,-3.4443],
// 4 16 -7.071 0 -7.071 -3.827 0 -9.239 -3.4443 0 -8.3151 -6.3639 0 -6.3639
  [4,16,-7.071,0,-7.071,-3.827,0,-9.239,-3.4443,0,-8.3151,-6.3639,0,-6.3639],
// 4 16 -3.827 0 -9.239 0 0 -10 0 0 -9 -3.4443 0 -8.3151
  [4,16,-3.827,0,-9.239,0,0,-10,0,0,-9,-3.4443,0,-8.3151],
// 4 16 0 0 -10 3.827 0 -9.239 3.4443 0 -8.3151 0 0 -9
  [4,16,0,0,-10,3.827,0,-9.239,3.4443,0,-8.3151,0,0,-9],
// 4 16 3.827 0 -9.239 7.071 0 -7.071 6.3639 0 -6.3639 3.4443 0 -8.3151
  [4,16,3.827,0,-9.239,7.071,0,-7.071,6.3639,0,-6.3639,3.4443,0,-8.3151],
// 4 16 7.071 0 -7.071 9.239 0 -3.827 8.3151 0 -3.4443 6.3639 0 -6.3639
  [4,16,7.071,0,-7.071,9.239,0,-3.827,8.3151,0,-3.4443,6.3639,0,-6.3639],
// 4 16 9.239 0 -3.827 10 0 0 9 0 0 8.3151 0 -3.4443
  [4,16,9.239,0,-3.827,10,0,0,9,0,0,8.3151,0,-3.4443],
// 0 // Build by LDPartEditor (PrimGen 2.X)
];
module ldraw_lib__4_4ring9(step=0, col=false, unit=2/5, alt=false, line=0.2, solid=!$preview)
    makepoly(ldraw_lib__4_4ring9(), step=step, col=col, unit=unit, alt=alt, line=line, solid=solid);
ldraw_lib__4_4ring9(line=0.2);
// file: ../p/4-4disc.scad
use <../lib.scad>
function ldraw_lib__4_4disc() = [
// 0 Disc 1.0
// 0 Name: 4-4disc.dat
// 0 Author: James Jessiman
// 0 !LDRAW_ORG Primitive UPDATE 2002-02
// 0 !LICENSE Licensed under CC BY 4.0 : see CAreadme.txt
// 
// 0 BFC CERTIFY CCW
  [0,"BFC","CERTIFY"],
  [0,"BFC","CCW"],
// 
// 0 !HISTORY 1998-12-15 [PTadmin] Official Update 1998-10
// 0 !HISTORY 2002-03-23 [sbliss] Added BFC statement
// 0 !HISTORY 2002-04-25 [PTadmin] Official Update 2002-02
// 0 !HISTORY 2007-06-24 [PTadmin] Header formatted for Contributor Agreement
// 0 !HISTORY 2008-07-01 [PTadmin] Official Update 2008-01
// 
// 
// 3 16 0 0 0 1 0 0 0.9239 0 0.3827
  [3,16,0,0,0,1,0,0,0.9239,0,0.3827],
// 3 16 0 0 0 0.9239 0 0.3827 0.7071 0 0.7071
  [3,16,0,0,0,0.9239,0,0.3827,0.7071,0,0.7071],
// 3 16 0 0 0 0.7071 0 0.7071 0.3827 0 0.9239
  [3,16,0,0,0,0.7071,0,0.7071,0.3827,0,0.9239],
// 3 16 0 0 0 0.3827 0 0.9239 0 0 1
  [3,16,0,0,0,0.3827,0,0.9239,0,0,1],
// 3 16 0 0 0 0 0 1 -0.3827 0 0.9239
  [3,16,0,0,0,0,0,1,-0.3827,0,0.9239],
// 3 16 0 0 0 -0.3827 0 0.9239 -0.7071 0 0.7071
  [3,16,0,0,0,-0.3827,0,0.9239,-0.7071,0,0.7071],
// 3 16 0 0 0 -0.7071 0 0.7071 -0.9239 0 0.3827
  [3,16,0,0,0,-0.7071,0,0.7071,-0.9239,0,0.3827],
// 3 16 0 0 0 -0.9239 0 0.3827 -1 0 -0
  [3,16,0,0,0,-0.9239,0,0.3827,-1,0,-0],
// 3 16 0 0 0 -1 0 -0 -0.9239 0 -0.3827
  [3,16,0,0,0,-1,0,-0,-0.9239,0,-0.3827],
// 3 16 0 0 0 -0.9239 0 -0.3827 -0.7071 0 -0.7071
  [3,16,0,0,0,-0.9239,0,-0.3827,-0.7071,0,-0.7071],
// 3 16 0 0 0 -0.7071 0 -0.7071 -0.3827 0 -0.9239
  [3,16,0,0,0,-0.7071,0,-0.7071,-0.3827,0,-0.9239],
// 3 16 0 0 0 -0.3827 0 -0.9239 0 0 -1
  [3,16,0,0,0,-0.3827,0,-0.9239,0,0,-1],
// 3 16 0 0 0 0 0 -1 0.3827 0 -0.9239
  [3,16,0,0,0,0,0,-1,0.3827,0,-0.9239],
// 3 16 0 0 0 0.3827 0 -0.9239 0.7071 0 -0.7071
  [3,16,0,0,0,0.3827,0,-0.9239,0.7071,0,-0.7071],
// 3 16 0 0 0 0.7071 0 -0.7071 0.9239 0 -0.3827
  [3,16,0,0,0,0.7071,0,-0.7071,0.9239,0,-0.3827],
// 3 16 0 0 0 0.9239 0 -0.3827 1 0 0
  [3,16,0,0,0,0.9239,0,-0.3827,1,0,0],
// 0
];
module ldraw_lib__4_4disc(step=0, col=false, unit=2/5, alt=false, line=0.2, solid=!$preview)
    makepoly(ldraw_lib__4_4disc(), step=step, col=col, unit=unit, alt=alt, line=line, solid=solid);
ldraw_lib__4_4disc(line=0.2);
// main file
use <../lib.scad>
use <../p/4-4disc.scad>
use <../p/4-4ring9.scad>
use <s/98138s02.scad>
function ldraw_lib__98138p3e() = [
// 0 Tile  1 x  1 Round with Black Disc (18 LDU Diameter) Pattern
// 0 Name: 98138p3e.dat
// 0 Author: Massimo Maso [Sirio]
// 0 !LDRAW_ORG Part UPDATE 2025-10
// 0 !LICENSE Licensed under CC BY 4.0 : see CAreadme.txt
// 
// 0 BFC CERTIFY CCW
  [0,"BFC","CERTIFY"],
  [0,"BFC","CCW"],
// 
// 0 !KEYWORDS Bricklink 98138pb450, F1, Formula one, Haas, race car
// 0 !KEYWORDS Rebrickable 98138pr0435, Set 66802, Set 77250, Speed Champions
// 
// 0 !HISTORY 2025-10-27 [OrionP] Official Update 2025-10
// 
// 0 // Subpart
// 1 16 0 0 0 1 0 0 0 1 0 0 0 1 s\98138s02.dat
  [1,16,0,0,0,1,0,0,0,1,0,0,0,1, ldraw_lib__s__98138s02()],
// 0 // Primitives
// 1 16 0 0 0 1 0 0 0 1 0 0 0 1 4-4ring9.dat
  [1,16,0,0,0,1,0,0,0,1,0,0,0,1, ldraw_lib__4_4ring9()],
// 1 0 0 0 0 9 0 0 0 1 0 0 0 9 4-4disc.dat
  [1,0,0,0,0,9,0,0,0,1,0,0,0,9, ldraw_lib__4_4disc()],
];
module ldraw_lib__98138p3e(step=0, col=false, unit=2/5, alt=false, line=0.2, solid=!$preview)
    makepoly(ldraw_lib__98138p3e(), step=step, col=col, unit=unit, alt=alt, line=line, solid=solid);
ldraw_lib__98138p3e(line=0.2);
